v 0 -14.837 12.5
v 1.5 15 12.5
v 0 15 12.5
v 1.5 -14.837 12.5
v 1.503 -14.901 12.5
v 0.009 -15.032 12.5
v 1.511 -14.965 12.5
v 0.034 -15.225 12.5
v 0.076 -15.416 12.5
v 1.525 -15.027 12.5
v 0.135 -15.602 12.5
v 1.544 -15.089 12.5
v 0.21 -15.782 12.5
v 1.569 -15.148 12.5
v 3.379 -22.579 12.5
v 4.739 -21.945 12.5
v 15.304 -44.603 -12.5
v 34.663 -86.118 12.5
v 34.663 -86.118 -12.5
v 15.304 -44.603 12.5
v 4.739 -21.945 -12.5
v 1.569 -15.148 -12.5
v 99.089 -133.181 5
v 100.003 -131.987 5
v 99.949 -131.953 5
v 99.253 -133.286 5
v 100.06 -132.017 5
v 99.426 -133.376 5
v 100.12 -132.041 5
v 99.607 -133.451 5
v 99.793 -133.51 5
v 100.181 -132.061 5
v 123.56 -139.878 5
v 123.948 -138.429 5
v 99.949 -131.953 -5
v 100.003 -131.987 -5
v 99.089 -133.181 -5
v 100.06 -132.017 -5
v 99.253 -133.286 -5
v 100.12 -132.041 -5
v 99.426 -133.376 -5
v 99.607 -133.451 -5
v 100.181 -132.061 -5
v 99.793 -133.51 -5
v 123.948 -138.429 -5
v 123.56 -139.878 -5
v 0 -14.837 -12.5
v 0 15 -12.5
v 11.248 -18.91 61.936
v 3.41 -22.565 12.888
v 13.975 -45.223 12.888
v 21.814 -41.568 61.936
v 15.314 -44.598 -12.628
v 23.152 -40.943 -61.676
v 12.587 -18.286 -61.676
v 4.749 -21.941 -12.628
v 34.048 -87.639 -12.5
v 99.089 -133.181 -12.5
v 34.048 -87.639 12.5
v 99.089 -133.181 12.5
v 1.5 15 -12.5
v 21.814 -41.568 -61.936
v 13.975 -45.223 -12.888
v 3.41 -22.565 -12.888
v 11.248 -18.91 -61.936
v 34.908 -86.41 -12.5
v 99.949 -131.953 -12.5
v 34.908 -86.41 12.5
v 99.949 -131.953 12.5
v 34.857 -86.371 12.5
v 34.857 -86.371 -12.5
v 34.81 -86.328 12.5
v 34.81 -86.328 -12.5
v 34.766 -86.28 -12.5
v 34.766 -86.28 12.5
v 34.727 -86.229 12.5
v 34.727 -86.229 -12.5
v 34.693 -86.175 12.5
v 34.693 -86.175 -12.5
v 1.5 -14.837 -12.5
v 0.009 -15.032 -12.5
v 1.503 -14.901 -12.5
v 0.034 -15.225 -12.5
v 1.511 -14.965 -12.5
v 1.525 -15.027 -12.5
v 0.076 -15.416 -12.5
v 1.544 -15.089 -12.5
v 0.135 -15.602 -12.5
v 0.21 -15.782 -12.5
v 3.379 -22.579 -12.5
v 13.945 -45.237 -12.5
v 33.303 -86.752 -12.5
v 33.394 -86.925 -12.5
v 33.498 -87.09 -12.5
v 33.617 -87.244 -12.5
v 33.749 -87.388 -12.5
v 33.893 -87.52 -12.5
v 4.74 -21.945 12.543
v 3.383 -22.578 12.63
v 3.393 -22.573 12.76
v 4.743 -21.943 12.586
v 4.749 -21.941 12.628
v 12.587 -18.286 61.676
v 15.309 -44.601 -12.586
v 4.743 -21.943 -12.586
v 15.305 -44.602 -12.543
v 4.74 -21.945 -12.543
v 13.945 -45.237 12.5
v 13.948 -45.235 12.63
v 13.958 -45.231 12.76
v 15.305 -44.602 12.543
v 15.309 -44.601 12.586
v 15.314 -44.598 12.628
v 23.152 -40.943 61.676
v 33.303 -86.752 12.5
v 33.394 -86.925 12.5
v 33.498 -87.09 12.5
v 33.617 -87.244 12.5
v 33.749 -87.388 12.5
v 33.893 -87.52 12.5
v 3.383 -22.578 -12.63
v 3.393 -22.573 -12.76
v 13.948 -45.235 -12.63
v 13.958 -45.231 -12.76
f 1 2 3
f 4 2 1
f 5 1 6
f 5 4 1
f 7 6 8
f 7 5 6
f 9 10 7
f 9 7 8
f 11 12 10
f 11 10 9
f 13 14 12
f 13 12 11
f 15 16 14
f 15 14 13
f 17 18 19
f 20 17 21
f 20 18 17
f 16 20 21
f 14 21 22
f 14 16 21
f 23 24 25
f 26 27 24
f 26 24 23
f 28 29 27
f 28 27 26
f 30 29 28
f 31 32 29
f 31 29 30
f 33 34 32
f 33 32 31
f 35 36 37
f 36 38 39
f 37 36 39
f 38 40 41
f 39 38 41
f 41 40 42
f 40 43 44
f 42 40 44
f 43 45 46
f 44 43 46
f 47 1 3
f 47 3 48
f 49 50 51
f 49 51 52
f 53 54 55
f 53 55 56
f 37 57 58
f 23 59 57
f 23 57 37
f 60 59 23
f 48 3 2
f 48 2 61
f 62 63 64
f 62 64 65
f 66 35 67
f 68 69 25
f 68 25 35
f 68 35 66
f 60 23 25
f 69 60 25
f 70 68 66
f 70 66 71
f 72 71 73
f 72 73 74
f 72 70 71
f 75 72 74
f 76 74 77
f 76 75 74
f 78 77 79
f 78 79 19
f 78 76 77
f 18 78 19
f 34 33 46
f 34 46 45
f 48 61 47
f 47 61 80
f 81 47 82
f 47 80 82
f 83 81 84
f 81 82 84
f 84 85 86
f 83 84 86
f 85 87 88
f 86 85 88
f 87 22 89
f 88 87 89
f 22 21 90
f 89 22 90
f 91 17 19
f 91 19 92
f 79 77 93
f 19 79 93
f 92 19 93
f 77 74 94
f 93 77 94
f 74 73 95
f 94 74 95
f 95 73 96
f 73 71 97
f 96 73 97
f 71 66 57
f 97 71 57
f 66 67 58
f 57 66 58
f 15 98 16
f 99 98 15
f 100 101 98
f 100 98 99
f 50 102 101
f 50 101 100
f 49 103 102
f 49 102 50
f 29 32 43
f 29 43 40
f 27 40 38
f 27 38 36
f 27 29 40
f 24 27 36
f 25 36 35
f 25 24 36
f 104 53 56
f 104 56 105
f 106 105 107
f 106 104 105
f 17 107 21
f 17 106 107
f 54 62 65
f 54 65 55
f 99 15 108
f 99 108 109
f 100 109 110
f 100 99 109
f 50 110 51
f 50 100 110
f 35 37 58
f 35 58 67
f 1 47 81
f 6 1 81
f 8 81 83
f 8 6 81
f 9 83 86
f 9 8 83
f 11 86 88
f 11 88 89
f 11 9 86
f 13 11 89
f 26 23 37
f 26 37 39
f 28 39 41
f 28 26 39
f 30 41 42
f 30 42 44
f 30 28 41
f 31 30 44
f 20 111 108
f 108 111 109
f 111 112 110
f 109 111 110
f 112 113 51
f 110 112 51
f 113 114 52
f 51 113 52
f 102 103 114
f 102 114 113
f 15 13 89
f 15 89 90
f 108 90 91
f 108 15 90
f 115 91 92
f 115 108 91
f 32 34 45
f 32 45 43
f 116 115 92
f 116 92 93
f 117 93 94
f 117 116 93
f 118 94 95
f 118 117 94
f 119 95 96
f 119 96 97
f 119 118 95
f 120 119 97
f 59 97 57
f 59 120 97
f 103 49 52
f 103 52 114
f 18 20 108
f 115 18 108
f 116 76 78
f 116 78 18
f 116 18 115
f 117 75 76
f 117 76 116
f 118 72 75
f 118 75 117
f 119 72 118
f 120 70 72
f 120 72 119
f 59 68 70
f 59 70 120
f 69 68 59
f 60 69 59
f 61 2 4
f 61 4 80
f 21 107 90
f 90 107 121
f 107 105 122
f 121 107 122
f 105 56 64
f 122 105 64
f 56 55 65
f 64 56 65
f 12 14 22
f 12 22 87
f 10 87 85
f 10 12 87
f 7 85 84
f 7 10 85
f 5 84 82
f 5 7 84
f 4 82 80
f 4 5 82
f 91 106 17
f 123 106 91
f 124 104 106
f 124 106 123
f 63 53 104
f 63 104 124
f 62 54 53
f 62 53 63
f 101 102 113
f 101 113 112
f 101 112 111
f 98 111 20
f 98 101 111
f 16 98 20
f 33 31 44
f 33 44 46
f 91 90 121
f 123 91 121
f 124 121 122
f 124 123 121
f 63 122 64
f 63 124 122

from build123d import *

# Parameters (mm, degrees)
SKETCH1_W                    = 25
SKETCH1_H                    = 30
BASE_FLANGE1_DEPTH           = 1.5
EDGE_FLANGE1_STRIP_CUT_DEPTH = 25
EDGE_FLANGE1_DEPTH           = 25
EDGE_FLANGE2_STRIP_CUT_DEPTH = 25
EDGE_FLANGE2_DEPTH           = 25
EDGE_FLANGE3_DEPTH           = 10
EDGE_FLANGE4_DEPTH           = 25
EDGE_FLANGE4_BEND_DEPTH      = 25


# Sheet-metal steps are written as plain solids
with BuildPart() as part:
    # Sketch1 → Base-Flange1 (new body)
    with BuildSketch(Plane(origin=(0, 0, 0), x_dir=(0, 0, -1), z_dir=(1, 0, 0))):
        Rectangle(SKETCH1_W, SKETCH1_H)
    extrude(amount=BASE_FLANGE1_DEPTH)

    # Edge-Flange1 strip (across the edge) → Edge-Flange1 strip cut (cut)
    with BuildSketch(Plane(origin=(1.5, -15, 12.5), x_dir=(0.9063077870366524, 0.4226182617406943, 0), z_dir=(0, 0, -1))):
        Polygon((-4.44875879, 5.991091638), (-1.290447996, -0.781927716), (0.069013684, -0.148000323), (-3.08929711, 6.625019031), align=None)
    extrude(amount=EDGE_FLANGE1_STRIP_CUT_DEPTH, mode=Mode.SUBTRACT)

    # Edge-Flange1 section (across the edge) → Edge-Flange1 (add)
    with BuildSketch(Plane(origin=(1.5, -15, 12.5), x_dir=(0.9063077870366524, 0.4226182617406943, 0), z_dir=(0, 0, -1))):
        with BuildLine():
            Line((-1.5, 0.163300289), (-1.5, 78.667458006))
            Line((-1.5, 78.667458006), (0, 78.667458006))
            Line((0, 78.667458006), (0, 0.163300289))
            ThreePointArc((0, 0.163300289), (0.017460361, 0.003870869), (0.069013684, -0.148000323))
            Line((0.069013684, -0.148000323), (-1.290447996, -0.781927716))
            ThreePointArc((-1.290447996, -0.781927716), (-1.44698365, -0.320788552), (-1.5, 0.163300289))
        make_face()
    extrude(amount=EDGE_FLANGE1_DEPTH)

    # Edge-Flange2 strip (across the edge) → Edge-Flange2 strip cut (cut)
    with BuildSketch(Plane(origin=(34.746304358, -86.296929777, 12.5), x_dir=(0.5735764363510556, 0.8191520442889852, 0), z_dir=(0, 0, -1))):
        Polygon((-4.936952418, 5.551052423), (-1.200352418, -0.920928625), (0.098685688, -0.170928625), (-3.637914312, 6.301052423), align=None)
    extrude(amount=EDGE_FLANGE2_STRIP_CUT_DEPTH, mode=Mode.SUBTRACT)

    # Edge-Flange2 section (across the edge) → Edge-Flange2 (add)
    with BuildSketch(Plane(origin=(34.746304358, -86.296929777, 12.5), x_dir=(0.5735764363510556, 0.8191520442889852, 0), z_dir=(0, 0, -1))):
        with BuildLine():
            Line((-1.5, 0.197371375), (-1.5, 79.598076211))
            Line((-1.5, 79.598076211), (0, 79.598076211))
            Line((0, 79.598076211), (0, 0.197371375))
            ThreePointArc((0, 0.197371375), (0.025099036, 0.006725267), (0.098685688, -0.170928625))
            Line((0.098685688, -0.170928625), (-1.200352418, -0.920928625))
            ThreePointArc((-1.200352418, -0.920928625), (-1.423789703, -0.381503301), (-1.5, 0.197371375))
        make_face()
    extrude(amount=EDGE_FLANGE2_DEPTH)

    # Edge-Flange3 section (across the edge) → Edge-Flange3 (add)
    with BuildSketch(Plane(origin=(100.055624686, -132.027008186, 5), x_dir=(0.2588190451025379, 0.9659258262890636, 0), z_dir=(0, 0, -1))):
        with BuildLine():
            Line((-1.5, 0.129882454), (-1.5, 24.735509529))
            Line((-1.5, 24.735509529), (0, 24.735509529))
            Line((0, 24.735509529), (0, 0.129882454))
            ThreePointArc((0, 0.129882454), (0.011190609, 0.001973206), (0.044422416, -0.122049584))
            Line((0.044422416, -0.122049584), (-1.365116516, -0.635079799))
            ThreePointArc((-1.365116516, -0.635079799), (-1.46602102, -0.25849906), (-1.5, 0.129882454))
        make_face()
    extrude(amount=EDGE_FLANGE3_DEPTH)

    # Edge-Flange4 section (across the edge) → Edge-Flange4 (add)
    with BuildSketch(Plane(origin=(4.738650647, -21.945308726, 12.56444415), x_dir=(0.8925389352890336, 0.41619774072677873, -0.17364817766692378), z_dir=(0.42261826174069417, -0.9063077870366525, 0))):
        with BuildLine():
            Line((-1.5, 0.06444415), (-1.5, 49.868767005))
            Line((-1.5, 49.868767005), (0, 49.868767005))
            Line((0, 49.868767005), (0, 0.06444415))
            ThreePointArc((0, 0.06444415), (0.002802985, 0.000245229), (0.011190609, -0.063465098))
            Line((0.011190609, -0.063465098), (-1.46602102, -0.323937365))
            ThreePointArc((-1.46602102, -0.323937365), (-1.491489062, -0.130488385), (-1.5, 0.06444415))
        make_face()
    extrude(amount=EDGE_FLANGE4_DEPTH)

    # Edge-Flange4 section 2 (across the edge) → Edge-Flange4 bend (add)
    with BuildSketch(Plane(origin=(15.304107191, -44.603003402, -12.56444415), x_dir=(0.8925389352890335, 0.41619774072677895, 0.17364817766692367), z_dir=(-0.4226182617406944, 0.9063077870366524, 0))):
        with BuildLine():
            Line((-1.5, 0.06444415), (-1.5, 49.868767005))
            Line((-1.5, 49.868767005), (0, 49.868767005))
            Line((0, 49.868767005), (0, 0.06444415))
            ThreePointArc((0, 0.06444415), (0.002802985, 0.000245229), (0.011190609, -0.063465098))
            Line((0.011190609, -0.063465098), (-1.46602102, -0.323937365))
            ThreePointArc((-1.46602102, -0.323937365), (-1.491489062, -0.130488385), (-1.5, 0.06444415))
        make_face()
    extrude(amount=EDGE_FLANGE4_BEND_DEPTH)


solid = part.part
